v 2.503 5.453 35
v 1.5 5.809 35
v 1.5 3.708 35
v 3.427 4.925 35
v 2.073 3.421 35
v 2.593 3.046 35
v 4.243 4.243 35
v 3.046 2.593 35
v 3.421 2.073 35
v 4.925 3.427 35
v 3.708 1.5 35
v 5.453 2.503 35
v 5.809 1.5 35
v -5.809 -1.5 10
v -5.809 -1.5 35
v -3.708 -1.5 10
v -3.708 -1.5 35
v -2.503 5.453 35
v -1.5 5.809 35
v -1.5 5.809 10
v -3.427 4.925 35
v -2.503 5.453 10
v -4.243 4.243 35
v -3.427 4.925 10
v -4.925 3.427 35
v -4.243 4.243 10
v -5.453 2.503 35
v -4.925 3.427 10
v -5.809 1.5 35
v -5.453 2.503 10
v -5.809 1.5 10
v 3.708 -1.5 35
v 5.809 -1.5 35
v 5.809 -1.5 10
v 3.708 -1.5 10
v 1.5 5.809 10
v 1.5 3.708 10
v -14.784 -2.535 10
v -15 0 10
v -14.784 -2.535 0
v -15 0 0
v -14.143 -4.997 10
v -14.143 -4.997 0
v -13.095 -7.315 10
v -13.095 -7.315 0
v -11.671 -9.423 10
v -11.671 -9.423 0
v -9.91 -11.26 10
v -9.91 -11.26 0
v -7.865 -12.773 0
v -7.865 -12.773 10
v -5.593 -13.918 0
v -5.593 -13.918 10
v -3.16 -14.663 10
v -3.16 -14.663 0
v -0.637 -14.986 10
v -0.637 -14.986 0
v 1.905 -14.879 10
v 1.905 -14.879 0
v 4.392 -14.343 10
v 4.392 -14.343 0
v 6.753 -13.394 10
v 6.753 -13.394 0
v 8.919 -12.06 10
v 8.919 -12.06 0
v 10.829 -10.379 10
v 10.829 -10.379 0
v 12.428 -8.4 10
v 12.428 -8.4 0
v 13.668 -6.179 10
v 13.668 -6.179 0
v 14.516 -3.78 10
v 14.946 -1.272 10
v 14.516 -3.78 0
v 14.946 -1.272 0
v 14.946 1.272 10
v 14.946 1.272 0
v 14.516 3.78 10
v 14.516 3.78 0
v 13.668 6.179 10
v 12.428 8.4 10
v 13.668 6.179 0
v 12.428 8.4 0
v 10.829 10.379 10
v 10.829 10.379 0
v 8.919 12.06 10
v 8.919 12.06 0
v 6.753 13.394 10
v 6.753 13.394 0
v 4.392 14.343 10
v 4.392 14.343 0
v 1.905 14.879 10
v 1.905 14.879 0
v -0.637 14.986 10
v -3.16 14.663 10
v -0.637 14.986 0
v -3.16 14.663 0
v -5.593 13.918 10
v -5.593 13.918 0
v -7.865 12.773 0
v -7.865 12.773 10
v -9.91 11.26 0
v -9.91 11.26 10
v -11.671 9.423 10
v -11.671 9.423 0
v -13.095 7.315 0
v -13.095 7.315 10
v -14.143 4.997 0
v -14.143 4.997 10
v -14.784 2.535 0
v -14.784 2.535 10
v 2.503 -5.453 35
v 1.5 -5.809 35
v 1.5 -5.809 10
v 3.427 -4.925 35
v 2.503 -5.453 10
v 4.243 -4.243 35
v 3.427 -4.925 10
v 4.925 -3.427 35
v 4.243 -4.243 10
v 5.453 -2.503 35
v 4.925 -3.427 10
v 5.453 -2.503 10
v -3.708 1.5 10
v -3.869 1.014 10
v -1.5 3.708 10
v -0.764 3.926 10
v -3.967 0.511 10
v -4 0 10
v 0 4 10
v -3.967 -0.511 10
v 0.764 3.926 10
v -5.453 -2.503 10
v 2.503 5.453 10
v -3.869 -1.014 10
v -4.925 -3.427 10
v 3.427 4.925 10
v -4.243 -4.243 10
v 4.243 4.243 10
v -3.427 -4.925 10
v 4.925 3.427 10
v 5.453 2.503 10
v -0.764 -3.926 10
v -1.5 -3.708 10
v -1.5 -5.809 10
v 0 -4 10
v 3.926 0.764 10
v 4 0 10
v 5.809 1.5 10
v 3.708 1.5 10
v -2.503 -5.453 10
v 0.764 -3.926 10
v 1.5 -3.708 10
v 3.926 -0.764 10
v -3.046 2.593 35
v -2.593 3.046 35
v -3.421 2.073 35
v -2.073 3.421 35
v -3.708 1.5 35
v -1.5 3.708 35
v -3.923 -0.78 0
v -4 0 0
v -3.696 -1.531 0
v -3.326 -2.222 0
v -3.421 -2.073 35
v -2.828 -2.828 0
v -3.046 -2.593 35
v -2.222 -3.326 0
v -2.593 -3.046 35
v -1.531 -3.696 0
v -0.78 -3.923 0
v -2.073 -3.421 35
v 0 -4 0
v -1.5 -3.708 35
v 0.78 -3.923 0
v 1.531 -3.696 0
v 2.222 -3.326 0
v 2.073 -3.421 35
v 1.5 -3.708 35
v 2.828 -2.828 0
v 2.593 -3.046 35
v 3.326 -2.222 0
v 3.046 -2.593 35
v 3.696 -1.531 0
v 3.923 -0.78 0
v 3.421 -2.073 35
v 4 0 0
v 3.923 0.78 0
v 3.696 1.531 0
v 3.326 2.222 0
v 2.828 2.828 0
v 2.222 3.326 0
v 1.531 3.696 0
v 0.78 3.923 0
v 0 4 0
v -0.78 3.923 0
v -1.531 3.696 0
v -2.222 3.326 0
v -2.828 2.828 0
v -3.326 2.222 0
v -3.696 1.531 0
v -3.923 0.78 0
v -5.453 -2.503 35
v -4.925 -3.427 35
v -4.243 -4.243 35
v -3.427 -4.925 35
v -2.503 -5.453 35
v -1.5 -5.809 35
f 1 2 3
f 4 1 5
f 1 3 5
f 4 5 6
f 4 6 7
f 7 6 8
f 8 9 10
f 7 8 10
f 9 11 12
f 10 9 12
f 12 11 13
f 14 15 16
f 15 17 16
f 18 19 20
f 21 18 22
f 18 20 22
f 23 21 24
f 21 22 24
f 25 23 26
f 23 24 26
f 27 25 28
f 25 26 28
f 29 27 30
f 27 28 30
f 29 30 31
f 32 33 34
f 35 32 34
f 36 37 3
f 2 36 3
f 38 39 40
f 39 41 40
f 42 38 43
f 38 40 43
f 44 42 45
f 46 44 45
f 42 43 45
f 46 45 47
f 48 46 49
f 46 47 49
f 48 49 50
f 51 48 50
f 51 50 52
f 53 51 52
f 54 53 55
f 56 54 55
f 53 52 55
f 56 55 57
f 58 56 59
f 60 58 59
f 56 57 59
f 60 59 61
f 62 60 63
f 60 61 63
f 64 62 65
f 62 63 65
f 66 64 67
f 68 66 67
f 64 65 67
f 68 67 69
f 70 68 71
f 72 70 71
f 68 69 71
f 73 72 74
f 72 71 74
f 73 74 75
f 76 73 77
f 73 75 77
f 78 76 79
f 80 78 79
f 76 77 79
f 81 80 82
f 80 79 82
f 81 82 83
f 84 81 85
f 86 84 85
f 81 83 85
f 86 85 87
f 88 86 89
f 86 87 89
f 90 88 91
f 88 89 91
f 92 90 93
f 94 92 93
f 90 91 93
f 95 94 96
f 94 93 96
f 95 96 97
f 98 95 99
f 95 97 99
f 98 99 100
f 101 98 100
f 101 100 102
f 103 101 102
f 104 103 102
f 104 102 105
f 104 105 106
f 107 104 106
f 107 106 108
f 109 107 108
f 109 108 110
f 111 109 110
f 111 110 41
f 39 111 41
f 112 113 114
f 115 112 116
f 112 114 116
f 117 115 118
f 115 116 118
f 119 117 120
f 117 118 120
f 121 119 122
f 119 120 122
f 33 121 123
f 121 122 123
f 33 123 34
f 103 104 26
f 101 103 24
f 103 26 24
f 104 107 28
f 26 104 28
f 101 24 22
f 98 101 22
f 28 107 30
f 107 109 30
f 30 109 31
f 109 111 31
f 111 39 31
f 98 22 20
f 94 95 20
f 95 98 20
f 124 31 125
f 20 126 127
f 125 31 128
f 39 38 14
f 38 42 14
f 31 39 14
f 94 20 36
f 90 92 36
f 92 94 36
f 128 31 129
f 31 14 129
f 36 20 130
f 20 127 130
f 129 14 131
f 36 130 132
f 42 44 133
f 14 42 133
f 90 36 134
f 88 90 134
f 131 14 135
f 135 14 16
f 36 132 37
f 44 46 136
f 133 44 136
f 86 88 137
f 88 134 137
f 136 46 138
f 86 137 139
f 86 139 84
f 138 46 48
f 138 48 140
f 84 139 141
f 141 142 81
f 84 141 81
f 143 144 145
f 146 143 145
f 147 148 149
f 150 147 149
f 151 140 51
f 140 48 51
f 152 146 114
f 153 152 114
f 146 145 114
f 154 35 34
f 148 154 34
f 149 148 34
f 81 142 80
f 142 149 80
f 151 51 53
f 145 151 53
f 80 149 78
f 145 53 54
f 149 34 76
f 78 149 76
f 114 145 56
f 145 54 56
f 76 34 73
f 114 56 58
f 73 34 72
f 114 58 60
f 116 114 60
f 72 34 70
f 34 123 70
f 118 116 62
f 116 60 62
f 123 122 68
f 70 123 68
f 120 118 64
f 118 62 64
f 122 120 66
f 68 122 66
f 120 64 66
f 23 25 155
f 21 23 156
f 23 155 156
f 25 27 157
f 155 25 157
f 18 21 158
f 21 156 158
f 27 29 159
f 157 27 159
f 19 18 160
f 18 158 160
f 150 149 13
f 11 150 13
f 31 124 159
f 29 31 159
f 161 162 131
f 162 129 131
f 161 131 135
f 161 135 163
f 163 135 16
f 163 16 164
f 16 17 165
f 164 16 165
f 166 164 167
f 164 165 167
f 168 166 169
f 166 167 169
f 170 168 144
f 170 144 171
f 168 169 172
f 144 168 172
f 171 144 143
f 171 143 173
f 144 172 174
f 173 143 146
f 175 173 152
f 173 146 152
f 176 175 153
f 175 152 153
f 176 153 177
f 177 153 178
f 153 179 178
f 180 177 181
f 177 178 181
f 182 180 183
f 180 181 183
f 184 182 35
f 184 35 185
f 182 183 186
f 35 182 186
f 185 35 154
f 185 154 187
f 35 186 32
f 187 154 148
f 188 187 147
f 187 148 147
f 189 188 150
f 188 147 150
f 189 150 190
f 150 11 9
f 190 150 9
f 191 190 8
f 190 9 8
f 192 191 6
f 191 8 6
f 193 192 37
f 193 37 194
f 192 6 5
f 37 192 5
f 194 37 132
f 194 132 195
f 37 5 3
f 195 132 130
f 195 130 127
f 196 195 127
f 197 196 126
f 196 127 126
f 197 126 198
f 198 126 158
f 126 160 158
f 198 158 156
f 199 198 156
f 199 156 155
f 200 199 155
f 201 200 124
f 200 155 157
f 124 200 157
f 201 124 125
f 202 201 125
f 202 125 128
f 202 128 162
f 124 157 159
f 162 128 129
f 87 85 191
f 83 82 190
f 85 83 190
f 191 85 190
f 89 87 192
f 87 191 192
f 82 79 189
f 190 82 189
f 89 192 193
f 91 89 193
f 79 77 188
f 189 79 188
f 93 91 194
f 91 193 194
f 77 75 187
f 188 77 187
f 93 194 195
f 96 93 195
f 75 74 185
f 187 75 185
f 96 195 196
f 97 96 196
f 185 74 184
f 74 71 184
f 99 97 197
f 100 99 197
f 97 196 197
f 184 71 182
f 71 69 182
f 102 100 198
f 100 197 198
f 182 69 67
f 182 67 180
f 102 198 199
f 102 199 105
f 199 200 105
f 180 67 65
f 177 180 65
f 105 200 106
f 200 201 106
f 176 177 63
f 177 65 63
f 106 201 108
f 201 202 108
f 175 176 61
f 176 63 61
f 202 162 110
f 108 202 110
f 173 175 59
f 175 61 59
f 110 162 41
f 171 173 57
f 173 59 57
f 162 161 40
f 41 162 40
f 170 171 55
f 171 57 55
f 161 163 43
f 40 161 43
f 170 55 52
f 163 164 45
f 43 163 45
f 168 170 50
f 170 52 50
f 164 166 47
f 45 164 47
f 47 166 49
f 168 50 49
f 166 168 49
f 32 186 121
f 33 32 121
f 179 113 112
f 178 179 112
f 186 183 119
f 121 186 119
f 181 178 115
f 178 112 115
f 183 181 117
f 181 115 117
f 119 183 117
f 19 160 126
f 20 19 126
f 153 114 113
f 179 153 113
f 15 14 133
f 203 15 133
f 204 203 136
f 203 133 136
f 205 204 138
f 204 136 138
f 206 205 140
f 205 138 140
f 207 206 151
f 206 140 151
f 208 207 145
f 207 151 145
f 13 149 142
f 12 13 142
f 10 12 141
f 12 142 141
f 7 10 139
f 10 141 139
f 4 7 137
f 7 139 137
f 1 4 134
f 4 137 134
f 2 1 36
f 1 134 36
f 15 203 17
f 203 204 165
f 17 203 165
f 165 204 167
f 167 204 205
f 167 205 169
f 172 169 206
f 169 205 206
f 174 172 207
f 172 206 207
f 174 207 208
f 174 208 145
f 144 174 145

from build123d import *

# Parameters (mm, degrees)
F3_D     = 8
F5_DEPTH = 12.5
F7_DEPTH = 12.5


with BuildPart() as f1:
    # F0 (on Front) → F1 (revolve)
    with BuildSketch(Plane.XZ):
        Polygon((-15, 0), (0, 0), (0, 35), (-6, 35), (-6, 10), (-15, 10), align=None)
    revolve(axis=Axis((0, 0, 17.5), (0, 0, 1)))

    # F3 (through all)
    with Locations(Plane(origin=(0, 0, 0), x_dir=(1, 0, 0), z_dir=(0, 0, -1))):
        with Locations((0, 0)):
            Hole(F3_D / 2)

    # F4 (on Front) → F5 (cut, symmetric)
    with BuildSketch(Plane.XZ):
        Polygon((-1.5, 10), (0, 10), (1.5, 10), (1.5, 35), (0, 35), (-1.5, 35), align=None)
    extrude(amount=F5_DEPTH, both=True, mode=Mode.SUBTRACT)

    # F6 (on Right) → F7 (cut, symmetric)
    with BuildSketch(Plane.YZ):
        Polygon((-1.5, 10), (0, 10), (1.5, 10), (1.5, 35.1293485655), (0, 35.1293485655), (-1.5, 35.1293485655), align=None)
    extrude(amount=F7_DEPTH, both=True, mode=Mode.SUBTRACT)


solid = f1.part
